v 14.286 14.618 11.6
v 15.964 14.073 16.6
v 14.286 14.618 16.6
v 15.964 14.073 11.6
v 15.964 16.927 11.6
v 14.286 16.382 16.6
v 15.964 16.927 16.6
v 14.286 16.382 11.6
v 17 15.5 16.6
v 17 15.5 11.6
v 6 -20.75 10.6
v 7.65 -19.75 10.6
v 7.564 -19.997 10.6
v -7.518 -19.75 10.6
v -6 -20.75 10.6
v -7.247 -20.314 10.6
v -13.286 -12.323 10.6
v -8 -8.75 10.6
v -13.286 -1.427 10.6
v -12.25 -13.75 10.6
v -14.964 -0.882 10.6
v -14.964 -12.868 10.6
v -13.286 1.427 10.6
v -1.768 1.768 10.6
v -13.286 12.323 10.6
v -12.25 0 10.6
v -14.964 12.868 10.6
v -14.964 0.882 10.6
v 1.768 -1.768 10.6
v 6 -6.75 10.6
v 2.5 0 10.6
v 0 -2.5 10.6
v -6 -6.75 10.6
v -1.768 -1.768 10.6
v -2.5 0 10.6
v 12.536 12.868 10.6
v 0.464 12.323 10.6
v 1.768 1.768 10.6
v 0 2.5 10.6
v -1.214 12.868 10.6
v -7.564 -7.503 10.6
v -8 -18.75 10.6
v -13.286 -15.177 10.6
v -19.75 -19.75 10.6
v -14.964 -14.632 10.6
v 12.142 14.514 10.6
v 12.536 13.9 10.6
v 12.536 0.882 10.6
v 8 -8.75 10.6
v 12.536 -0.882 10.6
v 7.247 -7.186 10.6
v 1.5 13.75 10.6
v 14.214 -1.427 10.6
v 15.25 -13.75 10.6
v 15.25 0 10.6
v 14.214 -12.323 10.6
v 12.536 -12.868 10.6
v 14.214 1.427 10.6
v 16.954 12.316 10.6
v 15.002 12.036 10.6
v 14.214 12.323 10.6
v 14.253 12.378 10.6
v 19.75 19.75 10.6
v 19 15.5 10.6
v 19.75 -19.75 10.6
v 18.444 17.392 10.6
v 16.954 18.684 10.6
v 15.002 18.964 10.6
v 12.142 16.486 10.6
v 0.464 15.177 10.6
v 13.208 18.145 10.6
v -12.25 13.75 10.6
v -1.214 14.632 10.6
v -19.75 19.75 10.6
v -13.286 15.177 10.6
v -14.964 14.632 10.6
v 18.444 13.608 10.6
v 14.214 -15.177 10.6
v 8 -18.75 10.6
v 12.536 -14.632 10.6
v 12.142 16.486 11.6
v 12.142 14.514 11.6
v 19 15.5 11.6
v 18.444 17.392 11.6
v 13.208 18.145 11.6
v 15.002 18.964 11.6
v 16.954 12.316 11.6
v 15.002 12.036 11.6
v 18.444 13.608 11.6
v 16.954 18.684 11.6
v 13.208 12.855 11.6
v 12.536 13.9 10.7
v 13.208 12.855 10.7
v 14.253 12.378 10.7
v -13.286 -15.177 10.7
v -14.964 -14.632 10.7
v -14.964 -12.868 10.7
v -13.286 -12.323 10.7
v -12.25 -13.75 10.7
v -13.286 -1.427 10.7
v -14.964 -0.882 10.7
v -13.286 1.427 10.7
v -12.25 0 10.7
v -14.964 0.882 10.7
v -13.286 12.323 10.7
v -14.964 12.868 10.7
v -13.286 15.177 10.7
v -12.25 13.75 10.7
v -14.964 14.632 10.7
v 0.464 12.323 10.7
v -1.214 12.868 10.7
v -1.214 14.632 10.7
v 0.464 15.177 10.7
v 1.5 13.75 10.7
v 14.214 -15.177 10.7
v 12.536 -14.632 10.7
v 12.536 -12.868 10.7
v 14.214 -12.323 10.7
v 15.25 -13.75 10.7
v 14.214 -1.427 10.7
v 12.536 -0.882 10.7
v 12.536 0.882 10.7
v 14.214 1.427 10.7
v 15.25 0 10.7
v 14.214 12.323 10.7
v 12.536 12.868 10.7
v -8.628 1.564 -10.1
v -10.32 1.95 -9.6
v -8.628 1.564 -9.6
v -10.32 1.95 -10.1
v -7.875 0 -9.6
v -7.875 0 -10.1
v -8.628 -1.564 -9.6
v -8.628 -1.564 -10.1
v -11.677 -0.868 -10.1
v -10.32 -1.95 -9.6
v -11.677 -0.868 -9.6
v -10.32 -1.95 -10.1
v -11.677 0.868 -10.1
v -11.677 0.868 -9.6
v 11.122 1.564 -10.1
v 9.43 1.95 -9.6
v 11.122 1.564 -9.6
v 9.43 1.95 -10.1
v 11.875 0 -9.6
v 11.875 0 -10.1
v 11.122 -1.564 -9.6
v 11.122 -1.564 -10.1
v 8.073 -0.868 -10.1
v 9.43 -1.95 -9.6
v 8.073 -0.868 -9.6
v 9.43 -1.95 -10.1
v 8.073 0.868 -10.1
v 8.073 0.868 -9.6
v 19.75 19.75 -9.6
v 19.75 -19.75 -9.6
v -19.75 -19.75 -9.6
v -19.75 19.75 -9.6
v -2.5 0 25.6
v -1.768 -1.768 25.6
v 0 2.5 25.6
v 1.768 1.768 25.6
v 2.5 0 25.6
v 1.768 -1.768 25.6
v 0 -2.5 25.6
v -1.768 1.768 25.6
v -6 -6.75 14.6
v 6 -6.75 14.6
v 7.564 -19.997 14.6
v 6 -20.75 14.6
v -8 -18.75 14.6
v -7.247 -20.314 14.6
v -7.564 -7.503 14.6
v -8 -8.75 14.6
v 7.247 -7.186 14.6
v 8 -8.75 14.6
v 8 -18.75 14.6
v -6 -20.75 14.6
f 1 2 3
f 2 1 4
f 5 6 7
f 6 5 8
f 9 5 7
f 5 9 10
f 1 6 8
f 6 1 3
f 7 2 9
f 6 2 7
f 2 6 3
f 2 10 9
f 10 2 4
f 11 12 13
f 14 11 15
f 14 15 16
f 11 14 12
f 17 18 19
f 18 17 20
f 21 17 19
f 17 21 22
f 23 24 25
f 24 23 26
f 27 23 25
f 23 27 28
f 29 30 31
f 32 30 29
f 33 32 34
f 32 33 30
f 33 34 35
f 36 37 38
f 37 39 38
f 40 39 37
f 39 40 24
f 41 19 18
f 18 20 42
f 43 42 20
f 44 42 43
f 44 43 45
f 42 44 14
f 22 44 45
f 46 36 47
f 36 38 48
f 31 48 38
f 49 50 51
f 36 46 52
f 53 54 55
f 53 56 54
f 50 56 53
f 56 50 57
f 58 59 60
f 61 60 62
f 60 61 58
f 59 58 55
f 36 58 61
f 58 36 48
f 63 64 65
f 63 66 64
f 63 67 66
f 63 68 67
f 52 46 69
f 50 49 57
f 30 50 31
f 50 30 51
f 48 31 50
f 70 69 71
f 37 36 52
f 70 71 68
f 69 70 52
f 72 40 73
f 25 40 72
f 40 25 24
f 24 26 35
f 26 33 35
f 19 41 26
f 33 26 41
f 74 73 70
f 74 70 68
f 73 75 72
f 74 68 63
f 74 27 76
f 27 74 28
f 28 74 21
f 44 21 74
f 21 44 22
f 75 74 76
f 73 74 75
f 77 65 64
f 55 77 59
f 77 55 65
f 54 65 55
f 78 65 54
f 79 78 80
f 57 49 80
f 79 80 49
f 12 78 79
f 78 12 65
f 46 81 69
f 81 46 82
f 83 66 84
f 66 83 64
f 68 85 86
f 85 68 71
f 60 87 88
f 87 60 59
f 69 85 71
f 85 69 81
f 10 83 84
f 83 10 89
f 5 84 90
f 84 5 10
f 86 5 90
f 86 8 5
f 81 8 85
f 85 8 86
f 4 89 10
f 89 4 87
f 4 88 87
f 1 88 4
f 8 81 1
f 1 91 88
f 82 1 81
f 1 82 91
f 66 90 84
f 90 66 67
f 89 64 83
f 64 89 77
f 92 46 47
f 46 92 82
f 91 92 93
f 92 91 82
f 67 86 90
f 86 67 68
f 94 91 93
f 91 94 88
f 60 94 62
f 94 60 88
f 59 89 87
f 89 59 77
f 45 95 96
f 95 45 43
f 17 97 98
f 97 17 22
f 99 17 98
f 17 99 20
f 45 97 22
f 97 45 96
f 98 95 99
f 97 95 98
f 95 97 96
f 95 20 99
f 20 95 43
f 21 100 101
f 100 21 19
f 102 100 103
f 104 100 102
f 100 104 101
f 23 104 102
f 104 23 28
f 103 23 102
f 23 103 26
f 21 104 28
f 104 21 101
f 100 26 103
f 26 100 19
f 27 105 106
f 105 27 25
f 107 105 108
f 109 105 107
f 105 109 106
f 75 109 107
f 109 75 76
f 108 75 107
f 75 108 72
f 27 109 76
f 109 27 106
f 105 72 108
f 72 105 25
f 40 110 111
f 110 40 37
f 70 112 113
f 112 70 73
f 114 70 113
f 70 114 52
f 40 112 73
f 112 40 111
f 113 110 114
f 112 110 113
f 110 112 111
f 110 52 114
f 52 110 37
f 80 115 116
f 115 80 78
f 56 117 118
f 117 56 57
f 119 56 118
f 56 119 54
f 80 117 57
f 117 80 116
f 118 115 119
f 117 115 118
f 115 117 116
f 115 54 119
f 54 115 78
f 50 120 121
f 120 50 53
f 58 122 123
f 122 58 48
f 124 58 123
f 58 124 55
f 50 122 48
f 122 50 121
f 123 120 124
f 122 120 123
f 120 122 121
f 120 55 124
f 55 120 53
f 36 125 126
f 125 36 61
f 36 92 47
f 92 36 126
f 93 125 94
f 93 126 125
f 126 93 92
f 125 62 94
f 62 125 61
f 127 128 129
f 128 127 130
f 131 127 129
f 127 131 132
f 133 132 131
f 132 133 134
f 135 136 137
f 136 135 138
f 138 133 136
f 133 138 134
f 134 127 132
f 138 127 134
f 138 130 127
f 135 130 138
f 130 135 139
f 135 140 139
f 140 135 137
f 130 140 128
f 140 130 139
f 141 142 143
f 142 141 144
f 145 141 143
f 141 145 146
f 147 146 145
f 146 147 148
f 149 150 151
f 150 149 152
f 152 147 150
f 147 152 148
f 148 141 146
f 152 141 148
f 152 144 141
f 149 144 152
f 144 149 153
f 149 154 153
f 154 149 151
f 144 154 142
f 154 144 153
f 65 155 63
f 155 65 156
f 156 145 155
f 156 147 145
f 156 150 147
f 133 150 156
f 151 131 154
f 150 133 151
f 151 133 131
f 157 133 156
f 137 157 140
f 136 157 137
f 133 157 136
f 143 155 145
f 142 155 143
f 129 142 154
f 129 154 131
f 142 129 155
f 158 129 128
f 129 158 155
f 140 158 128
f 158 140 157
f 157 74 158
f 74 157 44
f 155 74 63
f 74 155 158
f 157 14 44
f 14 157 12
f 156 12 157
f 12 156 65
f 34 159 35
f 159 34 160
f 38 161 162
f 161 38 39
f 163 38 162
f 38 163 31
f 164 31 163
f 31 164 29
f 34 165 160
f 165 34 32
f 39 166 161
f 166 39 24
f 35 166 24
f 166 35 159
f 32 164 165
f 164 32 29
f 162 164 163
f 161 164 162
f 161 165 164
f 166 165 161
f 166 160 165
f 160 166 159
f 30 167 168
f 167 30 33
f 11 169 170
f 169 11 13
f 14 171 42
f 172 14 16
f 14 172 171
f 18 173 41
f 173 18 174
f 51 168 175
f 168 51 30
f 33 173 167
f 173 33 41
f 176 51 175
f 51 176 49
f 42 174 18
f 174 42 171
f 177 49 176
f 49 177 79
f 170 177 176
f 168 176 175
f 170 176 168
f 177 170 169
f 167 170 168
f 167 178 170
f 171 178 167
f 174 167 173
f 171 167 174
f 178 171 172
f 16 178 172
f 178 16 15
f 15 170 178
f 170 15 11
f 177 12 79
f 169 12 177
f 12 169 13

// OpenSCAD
// Parameters
face_width = 39.5; //[20:80:0.1]
face_height = 39.5; //[20:80:0.1]
body_length = 19.2; //[10:40:0.1]
front_face_thickness = 2.0; //[1:6:0.1]
shaft_diameter = 5.0; //[2:10:0.1]
shaft_length = 15.0; //[5:40:0.1]
mounting_hole_spacing = 31.0; //[20:60:0.1]
mounting_hole_diameter = 3.2; //[2:6:0.1]
mounting_hole_depth = 6.0; //[2:20:0.1]
overlap = 1.0; //[0.5:2.0:0.1]
grill_hole_diameter = 3.0; //[1:8:0.1]
grill_hole_depth = 1.2; //[0.5:3:0.1]
grill_margin = 6.0; //[2:12:0.1]
d_plug_length = 12.0; //[6:30:0.1]
d_plug_width = 10.0; //[5:25:0.1]
d_plug_height = 4.0; //[2:10:0.1]
d_plug_rad = 2.0; //[0.5:6:0.1]
screw_shank_diameter = 3.0; //[2:6:0.1]
screw_length = 6.0; //[3:20:0.1]
washer_diameter = 7.0; //[4:16:0.1]
washer_thickness = 1.0; //[0.5:3:0.1]
rail_hole_diameter = 4.0; //[2:10:0.1]
rail_hole_depth = 1.5; //[0.5:4:0.1]

// Grill Hole Positions
module grill_hole_positions() {
  color([0.2, 0.2, 0.22]) {
    for (x = [-1, 0, 1])
      for (y = [-1, 0, 1])
        translate([x * (face_width/2 - grill_margin), y * (face_height/2 - grill_margin), body_length/2 + front_face_thickness/2 - overlap])
          cylinder(r=grill_hole_diameter/2, h=grill_hole_depth + overlap, center=true);
  }
}

// D Plug D
module d_plug_D() {
  color([0.8, 0.6, 0.2]) {
    translate([0, -(face_height/2 - grill_margin), body_length/2 + front_face_thickness - overlap + d_plug_height/2])
      linear_extrude(height=d_plug_height, center=true)
        offset(r=d_plug_rad)
          polygon(points=[
            [-d_plug_length/2, -d_plug_width/2],
            [d_plug_length/2, -d_plug_width/2],
            [d_plug_length/2, d_plug_width/2],
            [-d_plug_length/2, d_plug_width/2]
          ]);
  }
}

// Motor Shaft
module motor_shaft() {
  color("Silver") {
    translate([0, 0, body_length/2 + front_face_thickness - overlap + shaft_length/2])
      cylinder(r=shaft_diameter/2, h=shaft_length, center=true);
  }
}

// Screw And Washer
module screw_and_washer() {
  color([0.4, 0.4, 0.43]) {
    translate([mounting_hole_spacing/2, mounting_hole_spacing/2, body_length/2 + front_face_thickness - overlap + screw_length/2])
      cylinder(r=screw_shank_diameter/2, h=screw_length, center=true);
    translate([mounting_hole_spacing/2, mounting_hole_spacing/2, body_length/2 + front_face_thickness - overlap + washer_thickness/2])
      cylinder(r=washer_diameter/2, h=washer_thickness, center=true);
  }
}

// Rail Hole Positions
module rail_hole_positions() {
  color([0.15, 0.15, 0.17]) {
    for (x = [-1, 1])
      translate([x * face_width/4, 0, -(body_length/2 - (rail_hole_depth/2))])
        cylinder(r=rail_hole_diameter/2, h=rail_hole_depth + overlap, center=true);
  }
}

// Motor Body
module motor_body() {
  color("Black") {
    cube([face_width, face_height, body_length], center=true);
  }
}

// Front Face
module front_face() {
  color("Black") {
    translate([0, 0, body_length/2 + front_face_thickness/2 - overlap])
      cube([face_width, face_height, front_face_thickness], center=true);
  }
}

// Assembly
module assembly() {
  union() {
    motor_body();
    front_face();
    motor_shaft();
    d_plug_D();
    screw_and_washer();
    grill_hole_positions();
    rail_hole_positions();
  }
}

assembly();
